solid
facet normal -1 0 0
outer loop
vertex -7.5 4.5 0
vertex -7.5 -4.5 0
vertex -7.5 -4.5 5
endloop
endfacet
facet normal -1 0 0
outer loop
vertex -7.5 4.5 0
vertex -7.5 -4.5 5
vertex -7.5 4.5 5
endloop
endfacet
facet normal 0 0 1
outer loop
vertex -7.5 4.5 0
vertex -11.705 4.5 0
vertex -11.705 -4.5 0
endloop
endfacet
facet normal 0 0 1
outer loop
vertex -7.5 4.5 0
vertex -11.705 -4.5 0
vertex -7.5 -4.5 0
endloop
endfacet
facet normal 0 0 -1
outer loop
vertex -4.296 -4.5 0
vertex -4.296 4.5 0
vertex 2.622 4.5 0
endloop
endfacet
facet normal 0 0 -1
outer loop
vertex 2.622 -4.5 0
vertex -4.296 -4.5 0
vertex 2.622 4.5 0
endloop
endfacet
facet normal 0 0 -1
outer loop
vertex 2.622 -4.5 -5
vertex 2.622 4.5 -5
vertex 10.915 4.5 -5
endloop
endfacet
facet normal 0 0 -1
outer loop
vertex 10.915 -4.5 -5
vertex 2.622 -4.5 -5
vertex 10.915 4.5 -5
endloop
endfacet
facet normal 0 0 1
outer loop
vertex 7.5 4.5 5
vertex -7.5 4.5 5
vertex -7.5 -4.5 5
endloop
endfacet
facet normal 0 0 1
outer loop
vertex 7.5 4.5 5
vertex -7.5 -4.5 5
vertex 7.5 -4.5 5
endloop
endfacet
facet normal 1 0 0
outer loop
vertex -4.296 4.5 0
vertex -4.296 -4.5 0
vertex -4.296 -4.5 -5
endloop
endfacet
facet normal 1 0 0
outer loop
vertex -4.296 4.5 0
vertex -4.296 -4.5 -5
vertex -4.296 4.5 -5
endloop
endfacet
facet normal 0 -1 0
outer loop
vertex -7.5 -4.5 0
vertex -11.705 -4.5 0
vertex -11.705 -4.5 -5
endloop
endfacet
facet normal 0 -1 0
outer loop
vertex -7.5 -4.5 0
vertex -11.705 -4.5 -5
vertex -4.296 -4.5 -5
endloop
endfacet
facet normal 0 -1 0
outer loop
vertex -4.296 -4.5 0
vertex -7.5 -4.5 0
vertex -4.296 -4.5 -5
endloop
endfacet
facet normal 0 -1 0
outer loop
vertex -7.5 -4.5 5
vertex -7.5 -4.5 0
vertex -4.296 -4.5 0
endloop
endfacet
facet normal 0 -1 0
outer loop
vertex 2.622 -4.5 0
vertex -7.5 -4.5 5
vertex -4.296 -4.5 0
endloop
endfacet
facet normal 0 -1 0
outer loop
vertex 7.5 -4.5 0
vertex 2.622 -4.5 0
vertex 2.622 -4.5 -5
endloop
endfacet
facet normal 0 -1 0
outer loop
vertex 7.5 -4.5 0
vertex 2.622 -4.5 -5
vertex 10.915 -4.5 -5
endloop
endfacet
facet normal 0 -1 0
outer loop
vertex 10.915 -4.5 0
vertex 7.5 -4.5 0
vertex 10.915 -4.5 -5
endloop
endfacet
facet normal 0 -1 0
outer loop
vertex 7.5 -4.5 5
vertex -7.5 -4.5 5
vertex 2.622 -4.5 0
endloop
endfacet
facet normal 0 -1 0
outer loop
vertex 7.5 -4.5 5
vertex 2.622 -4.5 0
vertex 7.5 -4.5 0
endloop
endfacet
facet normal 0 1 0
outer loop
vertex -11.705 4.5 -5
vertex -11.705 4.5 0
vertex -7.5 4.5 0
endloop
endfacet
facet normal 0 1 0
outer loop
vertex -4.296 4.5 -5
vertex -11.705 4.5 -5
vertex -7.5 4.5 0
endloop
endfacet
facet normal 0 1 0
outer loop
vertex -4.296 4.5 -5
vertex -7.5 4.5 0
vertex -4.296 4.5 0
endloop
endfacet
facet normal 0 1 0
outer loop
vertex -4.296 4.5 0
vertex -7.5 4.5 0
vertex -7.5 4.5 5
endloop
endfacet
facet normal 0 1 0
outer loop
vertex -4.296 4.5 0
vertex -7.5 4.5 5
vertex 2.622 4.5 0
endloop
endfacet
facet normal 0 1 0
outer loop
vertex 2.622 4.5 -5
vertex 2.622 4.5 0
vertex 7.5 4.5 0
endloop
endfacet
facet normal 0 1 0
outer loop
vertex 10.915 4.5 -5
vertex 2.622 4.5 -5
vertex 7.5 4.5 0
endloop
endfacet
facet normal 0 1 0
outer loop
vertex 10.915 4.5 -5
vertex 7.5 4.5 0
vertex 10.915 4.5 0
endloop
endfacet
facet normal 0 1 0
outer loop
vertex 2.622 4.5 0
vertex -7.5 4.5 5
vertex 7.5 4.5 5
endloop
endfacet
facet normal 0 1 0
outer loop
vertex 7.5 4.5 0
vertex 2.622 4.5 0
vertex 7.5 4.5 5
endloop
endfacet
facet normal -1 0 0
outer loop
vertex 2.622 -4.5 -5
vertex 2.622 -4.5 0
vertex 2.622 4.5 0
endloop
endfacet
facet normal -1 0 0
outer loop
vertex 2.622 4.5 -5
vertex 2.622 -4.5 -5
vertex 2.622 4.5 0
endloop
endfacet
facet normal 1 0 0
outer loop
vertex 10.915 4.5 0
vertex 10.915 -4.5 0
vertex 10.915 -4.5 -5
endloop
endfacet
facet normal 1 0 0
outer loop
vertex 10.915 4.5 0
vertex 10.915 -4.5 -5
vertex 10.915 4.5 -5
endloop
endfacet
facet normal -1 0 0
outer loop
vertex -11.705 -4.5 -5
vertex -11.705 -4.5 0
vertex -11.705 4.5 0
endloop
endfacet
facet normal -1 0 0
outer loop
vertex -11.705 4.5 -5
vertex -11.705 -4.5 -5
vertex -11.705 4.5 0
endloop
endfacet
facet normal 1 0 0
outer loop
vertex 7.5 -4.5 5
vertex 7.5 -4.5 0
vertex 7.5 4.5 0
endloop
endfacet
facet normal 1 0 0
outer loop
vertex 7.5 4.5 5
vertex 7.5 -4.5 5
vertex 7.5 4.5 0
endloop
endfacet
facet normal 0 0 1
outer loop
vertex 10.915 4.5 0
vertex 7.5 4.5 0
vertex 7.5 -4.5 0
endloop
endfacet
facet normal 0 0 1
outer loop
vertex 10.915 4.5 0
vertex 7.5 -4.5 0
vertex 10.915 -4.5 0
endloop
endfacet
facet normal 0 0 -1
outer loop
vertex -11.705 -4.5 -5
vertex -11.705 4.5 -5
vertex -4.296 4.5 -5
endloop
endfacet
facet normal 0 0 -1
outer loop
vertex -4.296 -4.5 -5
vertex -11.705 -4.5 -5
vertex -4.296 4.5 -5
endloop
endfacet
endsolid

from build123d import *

# Parameters (mm, degrees)
SKETCH1_W           = 15
SKETCH1_H           = 9
BOSS_EXTRUDE1_DEPTH = 5
SKETCH2_W           = 7.408175253
SKETCH2_H           = 9
SKETCH2_W_2         = 8.292733492
BOSS_EXTRUDE2_DEPTH = 5


with BuildPart() as part:
    # Sketch1 → Boss-Extrude1 (new body)
    with BuildSketch(Plane.XY):
        Rectangle(SKETCH1_W, SKETCH1_H)
    extrude(amount=BOSS_EXTRUDE1_DEPTH)

    # Sketch2 → Boss-Extrude2 (add)
    with BuildSketch(Plane.XY):
        with Locations((-8.00051336, 0)):
            Rectangle(SKETCH2_W, SKETCH2_H)
        with Locations((6.768450098, 0)):
            Rectangle(SKETCH2_W_2, SKETCH2_H)
    extrude(amount=-BOSS_EXTRUDE2_DEPTH)


solid = part.part
